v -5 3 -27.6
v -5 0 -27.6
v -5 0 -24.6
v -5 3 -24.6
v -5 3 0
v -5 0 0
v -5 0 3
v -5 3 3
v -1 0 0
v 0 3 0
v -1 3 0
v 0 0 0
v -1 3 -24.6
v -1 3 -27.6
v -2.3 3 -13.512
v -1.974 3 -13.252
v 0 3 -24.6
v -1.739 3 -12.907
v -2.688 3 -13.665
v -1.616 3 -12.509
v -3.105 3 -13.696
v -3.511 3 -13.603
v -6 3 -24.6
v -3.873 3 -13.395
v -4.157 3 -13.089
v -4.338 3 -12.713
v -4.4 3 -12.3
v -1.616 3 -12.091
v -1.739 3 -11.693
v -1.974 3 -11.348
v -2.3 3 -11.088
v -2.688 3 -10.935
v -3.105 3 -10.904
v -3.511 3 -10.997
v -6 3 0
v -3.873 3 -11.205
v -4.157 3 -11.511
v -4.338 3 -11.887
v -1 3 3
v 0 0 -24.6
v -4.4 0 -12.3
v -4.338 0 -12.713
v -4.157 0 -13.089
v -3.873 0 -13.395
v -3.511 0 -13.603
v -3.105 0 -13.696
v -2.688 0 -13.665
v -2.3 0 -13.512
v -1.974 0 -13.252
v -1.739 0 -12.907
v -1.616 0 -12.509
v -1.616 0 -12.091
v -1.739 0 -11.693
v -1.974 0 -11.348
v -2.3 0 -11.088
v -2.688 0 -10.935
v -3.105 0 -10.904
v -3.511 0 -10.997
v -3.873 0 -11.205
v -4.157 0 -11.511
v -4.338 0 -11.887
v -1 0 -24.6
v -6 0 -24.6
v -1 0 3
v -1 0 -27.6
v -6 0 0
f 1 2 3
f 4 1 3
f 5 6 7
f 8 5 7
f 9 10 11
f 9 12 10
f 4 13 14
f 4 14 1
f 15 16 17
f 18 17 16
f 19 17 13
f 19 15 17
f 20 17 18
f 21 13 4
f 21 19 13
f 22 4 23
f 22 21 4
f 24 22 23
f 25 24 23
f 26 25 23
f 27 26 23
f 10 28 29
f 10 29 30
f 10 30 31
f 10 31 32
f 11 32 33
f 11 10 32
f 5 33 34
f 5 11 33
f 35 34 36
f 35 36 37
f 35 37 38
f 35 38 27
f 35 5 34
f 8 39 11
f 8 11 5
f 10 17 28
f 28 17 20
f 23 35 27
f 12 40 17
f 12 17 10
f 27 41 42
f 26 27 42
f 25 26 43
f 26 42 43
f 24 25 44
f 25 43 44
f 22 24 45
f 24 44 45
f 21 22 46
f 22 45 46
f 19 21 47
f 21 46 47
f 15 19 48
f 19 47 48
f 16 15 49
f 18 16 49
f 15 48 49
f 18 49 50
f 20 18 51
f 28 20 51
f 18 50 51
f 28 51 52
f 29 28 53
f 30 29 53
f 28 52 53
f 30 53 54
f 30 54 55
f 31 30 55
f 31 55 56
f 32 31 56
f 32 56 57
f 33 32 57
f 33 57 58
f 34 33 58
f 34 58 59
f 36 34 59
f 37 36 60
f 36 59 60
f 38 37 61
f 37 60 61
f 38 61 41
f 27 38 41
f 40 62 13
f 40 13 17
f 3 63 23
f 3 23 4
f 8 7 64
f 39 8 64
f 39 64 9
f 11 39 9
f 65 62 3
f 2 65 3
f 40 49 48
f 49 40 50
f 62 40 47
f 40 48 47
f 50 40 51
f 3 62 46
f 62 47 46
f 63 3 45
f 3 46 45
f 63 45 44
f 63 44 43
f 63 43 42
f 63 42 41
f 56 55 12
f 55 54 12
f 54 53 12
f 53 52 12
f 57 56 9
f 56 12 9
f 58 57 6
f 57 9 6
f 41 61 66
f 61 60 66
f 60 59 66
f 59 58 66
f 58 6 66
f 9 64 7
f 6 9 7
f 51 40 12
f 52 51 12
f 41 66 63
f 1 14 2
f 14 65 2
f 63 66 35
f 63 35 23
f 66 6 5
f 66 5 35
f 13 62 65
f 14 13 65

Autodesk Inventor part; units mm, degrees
ref_plane "YZ Plane" through (0, 0, 0) normal (1, 0, 0) x (0, 1, 0)
ref_plane "XZ Plane" through (0, 0, 0) normal (0, 1, 0) x (-1, 0, 0)
ref_plane "XY Plane" through (0, 0, 0) normal (0, 0, 1) x (1, 0, 0)
sketch "草圖1" plane through (0, 0, 0) normal (0, 1, 0) x (-1, 0, 0)
  line L0 (0, 0) -> (6, 0)
  line L1 (6, 0) -> (6, -24.6)
  line L2 (6, -24.6) -> (0, -24.6)
  line L3 (0, -24.6) -> (0, 0)
  line L4 (1, 0) -> (5, 0)
  line L5 (5, 0) -> (5, 3)
  line L6 (5, 3) -> (1, 3)
  line L7 (1, 3) -> (1, 0)
  line L8 (5, -24.6) -> (1, -24.6)
  line L9 (1, -24.6) -> (1, -27.6)
  line L10 (1, -27.6) -> (5, -27.6)
  line L11 (5, -27.6) -> (5, -24.6)
  line L12 (3, 0) -> (3, -24.6)
  line L13 (6, -12.3) -> (0, -12.3)
  circle A0 centre (3, -12.3) radius 1.4
  dimension "d0" = 24.6
  dimension "d1" = 6
  dimension "d2" = 4
  dimension "d3" = 3
  dimension "d4" = 3
  dimension "d5" = 4
  dimension "d6" = 2.8
extrude "擠出1" add sketch "草圖1" along normal blind 3 contours L0 L12 A0 L13 L3 | L7 L6 L5 L0 | L13 A0 L12 L2 L3 | L0 L1 L13 A0 L12 | L2 L11 L10 L9 | A0 L13 L1 L2 L12
properties part number "螺絲"
